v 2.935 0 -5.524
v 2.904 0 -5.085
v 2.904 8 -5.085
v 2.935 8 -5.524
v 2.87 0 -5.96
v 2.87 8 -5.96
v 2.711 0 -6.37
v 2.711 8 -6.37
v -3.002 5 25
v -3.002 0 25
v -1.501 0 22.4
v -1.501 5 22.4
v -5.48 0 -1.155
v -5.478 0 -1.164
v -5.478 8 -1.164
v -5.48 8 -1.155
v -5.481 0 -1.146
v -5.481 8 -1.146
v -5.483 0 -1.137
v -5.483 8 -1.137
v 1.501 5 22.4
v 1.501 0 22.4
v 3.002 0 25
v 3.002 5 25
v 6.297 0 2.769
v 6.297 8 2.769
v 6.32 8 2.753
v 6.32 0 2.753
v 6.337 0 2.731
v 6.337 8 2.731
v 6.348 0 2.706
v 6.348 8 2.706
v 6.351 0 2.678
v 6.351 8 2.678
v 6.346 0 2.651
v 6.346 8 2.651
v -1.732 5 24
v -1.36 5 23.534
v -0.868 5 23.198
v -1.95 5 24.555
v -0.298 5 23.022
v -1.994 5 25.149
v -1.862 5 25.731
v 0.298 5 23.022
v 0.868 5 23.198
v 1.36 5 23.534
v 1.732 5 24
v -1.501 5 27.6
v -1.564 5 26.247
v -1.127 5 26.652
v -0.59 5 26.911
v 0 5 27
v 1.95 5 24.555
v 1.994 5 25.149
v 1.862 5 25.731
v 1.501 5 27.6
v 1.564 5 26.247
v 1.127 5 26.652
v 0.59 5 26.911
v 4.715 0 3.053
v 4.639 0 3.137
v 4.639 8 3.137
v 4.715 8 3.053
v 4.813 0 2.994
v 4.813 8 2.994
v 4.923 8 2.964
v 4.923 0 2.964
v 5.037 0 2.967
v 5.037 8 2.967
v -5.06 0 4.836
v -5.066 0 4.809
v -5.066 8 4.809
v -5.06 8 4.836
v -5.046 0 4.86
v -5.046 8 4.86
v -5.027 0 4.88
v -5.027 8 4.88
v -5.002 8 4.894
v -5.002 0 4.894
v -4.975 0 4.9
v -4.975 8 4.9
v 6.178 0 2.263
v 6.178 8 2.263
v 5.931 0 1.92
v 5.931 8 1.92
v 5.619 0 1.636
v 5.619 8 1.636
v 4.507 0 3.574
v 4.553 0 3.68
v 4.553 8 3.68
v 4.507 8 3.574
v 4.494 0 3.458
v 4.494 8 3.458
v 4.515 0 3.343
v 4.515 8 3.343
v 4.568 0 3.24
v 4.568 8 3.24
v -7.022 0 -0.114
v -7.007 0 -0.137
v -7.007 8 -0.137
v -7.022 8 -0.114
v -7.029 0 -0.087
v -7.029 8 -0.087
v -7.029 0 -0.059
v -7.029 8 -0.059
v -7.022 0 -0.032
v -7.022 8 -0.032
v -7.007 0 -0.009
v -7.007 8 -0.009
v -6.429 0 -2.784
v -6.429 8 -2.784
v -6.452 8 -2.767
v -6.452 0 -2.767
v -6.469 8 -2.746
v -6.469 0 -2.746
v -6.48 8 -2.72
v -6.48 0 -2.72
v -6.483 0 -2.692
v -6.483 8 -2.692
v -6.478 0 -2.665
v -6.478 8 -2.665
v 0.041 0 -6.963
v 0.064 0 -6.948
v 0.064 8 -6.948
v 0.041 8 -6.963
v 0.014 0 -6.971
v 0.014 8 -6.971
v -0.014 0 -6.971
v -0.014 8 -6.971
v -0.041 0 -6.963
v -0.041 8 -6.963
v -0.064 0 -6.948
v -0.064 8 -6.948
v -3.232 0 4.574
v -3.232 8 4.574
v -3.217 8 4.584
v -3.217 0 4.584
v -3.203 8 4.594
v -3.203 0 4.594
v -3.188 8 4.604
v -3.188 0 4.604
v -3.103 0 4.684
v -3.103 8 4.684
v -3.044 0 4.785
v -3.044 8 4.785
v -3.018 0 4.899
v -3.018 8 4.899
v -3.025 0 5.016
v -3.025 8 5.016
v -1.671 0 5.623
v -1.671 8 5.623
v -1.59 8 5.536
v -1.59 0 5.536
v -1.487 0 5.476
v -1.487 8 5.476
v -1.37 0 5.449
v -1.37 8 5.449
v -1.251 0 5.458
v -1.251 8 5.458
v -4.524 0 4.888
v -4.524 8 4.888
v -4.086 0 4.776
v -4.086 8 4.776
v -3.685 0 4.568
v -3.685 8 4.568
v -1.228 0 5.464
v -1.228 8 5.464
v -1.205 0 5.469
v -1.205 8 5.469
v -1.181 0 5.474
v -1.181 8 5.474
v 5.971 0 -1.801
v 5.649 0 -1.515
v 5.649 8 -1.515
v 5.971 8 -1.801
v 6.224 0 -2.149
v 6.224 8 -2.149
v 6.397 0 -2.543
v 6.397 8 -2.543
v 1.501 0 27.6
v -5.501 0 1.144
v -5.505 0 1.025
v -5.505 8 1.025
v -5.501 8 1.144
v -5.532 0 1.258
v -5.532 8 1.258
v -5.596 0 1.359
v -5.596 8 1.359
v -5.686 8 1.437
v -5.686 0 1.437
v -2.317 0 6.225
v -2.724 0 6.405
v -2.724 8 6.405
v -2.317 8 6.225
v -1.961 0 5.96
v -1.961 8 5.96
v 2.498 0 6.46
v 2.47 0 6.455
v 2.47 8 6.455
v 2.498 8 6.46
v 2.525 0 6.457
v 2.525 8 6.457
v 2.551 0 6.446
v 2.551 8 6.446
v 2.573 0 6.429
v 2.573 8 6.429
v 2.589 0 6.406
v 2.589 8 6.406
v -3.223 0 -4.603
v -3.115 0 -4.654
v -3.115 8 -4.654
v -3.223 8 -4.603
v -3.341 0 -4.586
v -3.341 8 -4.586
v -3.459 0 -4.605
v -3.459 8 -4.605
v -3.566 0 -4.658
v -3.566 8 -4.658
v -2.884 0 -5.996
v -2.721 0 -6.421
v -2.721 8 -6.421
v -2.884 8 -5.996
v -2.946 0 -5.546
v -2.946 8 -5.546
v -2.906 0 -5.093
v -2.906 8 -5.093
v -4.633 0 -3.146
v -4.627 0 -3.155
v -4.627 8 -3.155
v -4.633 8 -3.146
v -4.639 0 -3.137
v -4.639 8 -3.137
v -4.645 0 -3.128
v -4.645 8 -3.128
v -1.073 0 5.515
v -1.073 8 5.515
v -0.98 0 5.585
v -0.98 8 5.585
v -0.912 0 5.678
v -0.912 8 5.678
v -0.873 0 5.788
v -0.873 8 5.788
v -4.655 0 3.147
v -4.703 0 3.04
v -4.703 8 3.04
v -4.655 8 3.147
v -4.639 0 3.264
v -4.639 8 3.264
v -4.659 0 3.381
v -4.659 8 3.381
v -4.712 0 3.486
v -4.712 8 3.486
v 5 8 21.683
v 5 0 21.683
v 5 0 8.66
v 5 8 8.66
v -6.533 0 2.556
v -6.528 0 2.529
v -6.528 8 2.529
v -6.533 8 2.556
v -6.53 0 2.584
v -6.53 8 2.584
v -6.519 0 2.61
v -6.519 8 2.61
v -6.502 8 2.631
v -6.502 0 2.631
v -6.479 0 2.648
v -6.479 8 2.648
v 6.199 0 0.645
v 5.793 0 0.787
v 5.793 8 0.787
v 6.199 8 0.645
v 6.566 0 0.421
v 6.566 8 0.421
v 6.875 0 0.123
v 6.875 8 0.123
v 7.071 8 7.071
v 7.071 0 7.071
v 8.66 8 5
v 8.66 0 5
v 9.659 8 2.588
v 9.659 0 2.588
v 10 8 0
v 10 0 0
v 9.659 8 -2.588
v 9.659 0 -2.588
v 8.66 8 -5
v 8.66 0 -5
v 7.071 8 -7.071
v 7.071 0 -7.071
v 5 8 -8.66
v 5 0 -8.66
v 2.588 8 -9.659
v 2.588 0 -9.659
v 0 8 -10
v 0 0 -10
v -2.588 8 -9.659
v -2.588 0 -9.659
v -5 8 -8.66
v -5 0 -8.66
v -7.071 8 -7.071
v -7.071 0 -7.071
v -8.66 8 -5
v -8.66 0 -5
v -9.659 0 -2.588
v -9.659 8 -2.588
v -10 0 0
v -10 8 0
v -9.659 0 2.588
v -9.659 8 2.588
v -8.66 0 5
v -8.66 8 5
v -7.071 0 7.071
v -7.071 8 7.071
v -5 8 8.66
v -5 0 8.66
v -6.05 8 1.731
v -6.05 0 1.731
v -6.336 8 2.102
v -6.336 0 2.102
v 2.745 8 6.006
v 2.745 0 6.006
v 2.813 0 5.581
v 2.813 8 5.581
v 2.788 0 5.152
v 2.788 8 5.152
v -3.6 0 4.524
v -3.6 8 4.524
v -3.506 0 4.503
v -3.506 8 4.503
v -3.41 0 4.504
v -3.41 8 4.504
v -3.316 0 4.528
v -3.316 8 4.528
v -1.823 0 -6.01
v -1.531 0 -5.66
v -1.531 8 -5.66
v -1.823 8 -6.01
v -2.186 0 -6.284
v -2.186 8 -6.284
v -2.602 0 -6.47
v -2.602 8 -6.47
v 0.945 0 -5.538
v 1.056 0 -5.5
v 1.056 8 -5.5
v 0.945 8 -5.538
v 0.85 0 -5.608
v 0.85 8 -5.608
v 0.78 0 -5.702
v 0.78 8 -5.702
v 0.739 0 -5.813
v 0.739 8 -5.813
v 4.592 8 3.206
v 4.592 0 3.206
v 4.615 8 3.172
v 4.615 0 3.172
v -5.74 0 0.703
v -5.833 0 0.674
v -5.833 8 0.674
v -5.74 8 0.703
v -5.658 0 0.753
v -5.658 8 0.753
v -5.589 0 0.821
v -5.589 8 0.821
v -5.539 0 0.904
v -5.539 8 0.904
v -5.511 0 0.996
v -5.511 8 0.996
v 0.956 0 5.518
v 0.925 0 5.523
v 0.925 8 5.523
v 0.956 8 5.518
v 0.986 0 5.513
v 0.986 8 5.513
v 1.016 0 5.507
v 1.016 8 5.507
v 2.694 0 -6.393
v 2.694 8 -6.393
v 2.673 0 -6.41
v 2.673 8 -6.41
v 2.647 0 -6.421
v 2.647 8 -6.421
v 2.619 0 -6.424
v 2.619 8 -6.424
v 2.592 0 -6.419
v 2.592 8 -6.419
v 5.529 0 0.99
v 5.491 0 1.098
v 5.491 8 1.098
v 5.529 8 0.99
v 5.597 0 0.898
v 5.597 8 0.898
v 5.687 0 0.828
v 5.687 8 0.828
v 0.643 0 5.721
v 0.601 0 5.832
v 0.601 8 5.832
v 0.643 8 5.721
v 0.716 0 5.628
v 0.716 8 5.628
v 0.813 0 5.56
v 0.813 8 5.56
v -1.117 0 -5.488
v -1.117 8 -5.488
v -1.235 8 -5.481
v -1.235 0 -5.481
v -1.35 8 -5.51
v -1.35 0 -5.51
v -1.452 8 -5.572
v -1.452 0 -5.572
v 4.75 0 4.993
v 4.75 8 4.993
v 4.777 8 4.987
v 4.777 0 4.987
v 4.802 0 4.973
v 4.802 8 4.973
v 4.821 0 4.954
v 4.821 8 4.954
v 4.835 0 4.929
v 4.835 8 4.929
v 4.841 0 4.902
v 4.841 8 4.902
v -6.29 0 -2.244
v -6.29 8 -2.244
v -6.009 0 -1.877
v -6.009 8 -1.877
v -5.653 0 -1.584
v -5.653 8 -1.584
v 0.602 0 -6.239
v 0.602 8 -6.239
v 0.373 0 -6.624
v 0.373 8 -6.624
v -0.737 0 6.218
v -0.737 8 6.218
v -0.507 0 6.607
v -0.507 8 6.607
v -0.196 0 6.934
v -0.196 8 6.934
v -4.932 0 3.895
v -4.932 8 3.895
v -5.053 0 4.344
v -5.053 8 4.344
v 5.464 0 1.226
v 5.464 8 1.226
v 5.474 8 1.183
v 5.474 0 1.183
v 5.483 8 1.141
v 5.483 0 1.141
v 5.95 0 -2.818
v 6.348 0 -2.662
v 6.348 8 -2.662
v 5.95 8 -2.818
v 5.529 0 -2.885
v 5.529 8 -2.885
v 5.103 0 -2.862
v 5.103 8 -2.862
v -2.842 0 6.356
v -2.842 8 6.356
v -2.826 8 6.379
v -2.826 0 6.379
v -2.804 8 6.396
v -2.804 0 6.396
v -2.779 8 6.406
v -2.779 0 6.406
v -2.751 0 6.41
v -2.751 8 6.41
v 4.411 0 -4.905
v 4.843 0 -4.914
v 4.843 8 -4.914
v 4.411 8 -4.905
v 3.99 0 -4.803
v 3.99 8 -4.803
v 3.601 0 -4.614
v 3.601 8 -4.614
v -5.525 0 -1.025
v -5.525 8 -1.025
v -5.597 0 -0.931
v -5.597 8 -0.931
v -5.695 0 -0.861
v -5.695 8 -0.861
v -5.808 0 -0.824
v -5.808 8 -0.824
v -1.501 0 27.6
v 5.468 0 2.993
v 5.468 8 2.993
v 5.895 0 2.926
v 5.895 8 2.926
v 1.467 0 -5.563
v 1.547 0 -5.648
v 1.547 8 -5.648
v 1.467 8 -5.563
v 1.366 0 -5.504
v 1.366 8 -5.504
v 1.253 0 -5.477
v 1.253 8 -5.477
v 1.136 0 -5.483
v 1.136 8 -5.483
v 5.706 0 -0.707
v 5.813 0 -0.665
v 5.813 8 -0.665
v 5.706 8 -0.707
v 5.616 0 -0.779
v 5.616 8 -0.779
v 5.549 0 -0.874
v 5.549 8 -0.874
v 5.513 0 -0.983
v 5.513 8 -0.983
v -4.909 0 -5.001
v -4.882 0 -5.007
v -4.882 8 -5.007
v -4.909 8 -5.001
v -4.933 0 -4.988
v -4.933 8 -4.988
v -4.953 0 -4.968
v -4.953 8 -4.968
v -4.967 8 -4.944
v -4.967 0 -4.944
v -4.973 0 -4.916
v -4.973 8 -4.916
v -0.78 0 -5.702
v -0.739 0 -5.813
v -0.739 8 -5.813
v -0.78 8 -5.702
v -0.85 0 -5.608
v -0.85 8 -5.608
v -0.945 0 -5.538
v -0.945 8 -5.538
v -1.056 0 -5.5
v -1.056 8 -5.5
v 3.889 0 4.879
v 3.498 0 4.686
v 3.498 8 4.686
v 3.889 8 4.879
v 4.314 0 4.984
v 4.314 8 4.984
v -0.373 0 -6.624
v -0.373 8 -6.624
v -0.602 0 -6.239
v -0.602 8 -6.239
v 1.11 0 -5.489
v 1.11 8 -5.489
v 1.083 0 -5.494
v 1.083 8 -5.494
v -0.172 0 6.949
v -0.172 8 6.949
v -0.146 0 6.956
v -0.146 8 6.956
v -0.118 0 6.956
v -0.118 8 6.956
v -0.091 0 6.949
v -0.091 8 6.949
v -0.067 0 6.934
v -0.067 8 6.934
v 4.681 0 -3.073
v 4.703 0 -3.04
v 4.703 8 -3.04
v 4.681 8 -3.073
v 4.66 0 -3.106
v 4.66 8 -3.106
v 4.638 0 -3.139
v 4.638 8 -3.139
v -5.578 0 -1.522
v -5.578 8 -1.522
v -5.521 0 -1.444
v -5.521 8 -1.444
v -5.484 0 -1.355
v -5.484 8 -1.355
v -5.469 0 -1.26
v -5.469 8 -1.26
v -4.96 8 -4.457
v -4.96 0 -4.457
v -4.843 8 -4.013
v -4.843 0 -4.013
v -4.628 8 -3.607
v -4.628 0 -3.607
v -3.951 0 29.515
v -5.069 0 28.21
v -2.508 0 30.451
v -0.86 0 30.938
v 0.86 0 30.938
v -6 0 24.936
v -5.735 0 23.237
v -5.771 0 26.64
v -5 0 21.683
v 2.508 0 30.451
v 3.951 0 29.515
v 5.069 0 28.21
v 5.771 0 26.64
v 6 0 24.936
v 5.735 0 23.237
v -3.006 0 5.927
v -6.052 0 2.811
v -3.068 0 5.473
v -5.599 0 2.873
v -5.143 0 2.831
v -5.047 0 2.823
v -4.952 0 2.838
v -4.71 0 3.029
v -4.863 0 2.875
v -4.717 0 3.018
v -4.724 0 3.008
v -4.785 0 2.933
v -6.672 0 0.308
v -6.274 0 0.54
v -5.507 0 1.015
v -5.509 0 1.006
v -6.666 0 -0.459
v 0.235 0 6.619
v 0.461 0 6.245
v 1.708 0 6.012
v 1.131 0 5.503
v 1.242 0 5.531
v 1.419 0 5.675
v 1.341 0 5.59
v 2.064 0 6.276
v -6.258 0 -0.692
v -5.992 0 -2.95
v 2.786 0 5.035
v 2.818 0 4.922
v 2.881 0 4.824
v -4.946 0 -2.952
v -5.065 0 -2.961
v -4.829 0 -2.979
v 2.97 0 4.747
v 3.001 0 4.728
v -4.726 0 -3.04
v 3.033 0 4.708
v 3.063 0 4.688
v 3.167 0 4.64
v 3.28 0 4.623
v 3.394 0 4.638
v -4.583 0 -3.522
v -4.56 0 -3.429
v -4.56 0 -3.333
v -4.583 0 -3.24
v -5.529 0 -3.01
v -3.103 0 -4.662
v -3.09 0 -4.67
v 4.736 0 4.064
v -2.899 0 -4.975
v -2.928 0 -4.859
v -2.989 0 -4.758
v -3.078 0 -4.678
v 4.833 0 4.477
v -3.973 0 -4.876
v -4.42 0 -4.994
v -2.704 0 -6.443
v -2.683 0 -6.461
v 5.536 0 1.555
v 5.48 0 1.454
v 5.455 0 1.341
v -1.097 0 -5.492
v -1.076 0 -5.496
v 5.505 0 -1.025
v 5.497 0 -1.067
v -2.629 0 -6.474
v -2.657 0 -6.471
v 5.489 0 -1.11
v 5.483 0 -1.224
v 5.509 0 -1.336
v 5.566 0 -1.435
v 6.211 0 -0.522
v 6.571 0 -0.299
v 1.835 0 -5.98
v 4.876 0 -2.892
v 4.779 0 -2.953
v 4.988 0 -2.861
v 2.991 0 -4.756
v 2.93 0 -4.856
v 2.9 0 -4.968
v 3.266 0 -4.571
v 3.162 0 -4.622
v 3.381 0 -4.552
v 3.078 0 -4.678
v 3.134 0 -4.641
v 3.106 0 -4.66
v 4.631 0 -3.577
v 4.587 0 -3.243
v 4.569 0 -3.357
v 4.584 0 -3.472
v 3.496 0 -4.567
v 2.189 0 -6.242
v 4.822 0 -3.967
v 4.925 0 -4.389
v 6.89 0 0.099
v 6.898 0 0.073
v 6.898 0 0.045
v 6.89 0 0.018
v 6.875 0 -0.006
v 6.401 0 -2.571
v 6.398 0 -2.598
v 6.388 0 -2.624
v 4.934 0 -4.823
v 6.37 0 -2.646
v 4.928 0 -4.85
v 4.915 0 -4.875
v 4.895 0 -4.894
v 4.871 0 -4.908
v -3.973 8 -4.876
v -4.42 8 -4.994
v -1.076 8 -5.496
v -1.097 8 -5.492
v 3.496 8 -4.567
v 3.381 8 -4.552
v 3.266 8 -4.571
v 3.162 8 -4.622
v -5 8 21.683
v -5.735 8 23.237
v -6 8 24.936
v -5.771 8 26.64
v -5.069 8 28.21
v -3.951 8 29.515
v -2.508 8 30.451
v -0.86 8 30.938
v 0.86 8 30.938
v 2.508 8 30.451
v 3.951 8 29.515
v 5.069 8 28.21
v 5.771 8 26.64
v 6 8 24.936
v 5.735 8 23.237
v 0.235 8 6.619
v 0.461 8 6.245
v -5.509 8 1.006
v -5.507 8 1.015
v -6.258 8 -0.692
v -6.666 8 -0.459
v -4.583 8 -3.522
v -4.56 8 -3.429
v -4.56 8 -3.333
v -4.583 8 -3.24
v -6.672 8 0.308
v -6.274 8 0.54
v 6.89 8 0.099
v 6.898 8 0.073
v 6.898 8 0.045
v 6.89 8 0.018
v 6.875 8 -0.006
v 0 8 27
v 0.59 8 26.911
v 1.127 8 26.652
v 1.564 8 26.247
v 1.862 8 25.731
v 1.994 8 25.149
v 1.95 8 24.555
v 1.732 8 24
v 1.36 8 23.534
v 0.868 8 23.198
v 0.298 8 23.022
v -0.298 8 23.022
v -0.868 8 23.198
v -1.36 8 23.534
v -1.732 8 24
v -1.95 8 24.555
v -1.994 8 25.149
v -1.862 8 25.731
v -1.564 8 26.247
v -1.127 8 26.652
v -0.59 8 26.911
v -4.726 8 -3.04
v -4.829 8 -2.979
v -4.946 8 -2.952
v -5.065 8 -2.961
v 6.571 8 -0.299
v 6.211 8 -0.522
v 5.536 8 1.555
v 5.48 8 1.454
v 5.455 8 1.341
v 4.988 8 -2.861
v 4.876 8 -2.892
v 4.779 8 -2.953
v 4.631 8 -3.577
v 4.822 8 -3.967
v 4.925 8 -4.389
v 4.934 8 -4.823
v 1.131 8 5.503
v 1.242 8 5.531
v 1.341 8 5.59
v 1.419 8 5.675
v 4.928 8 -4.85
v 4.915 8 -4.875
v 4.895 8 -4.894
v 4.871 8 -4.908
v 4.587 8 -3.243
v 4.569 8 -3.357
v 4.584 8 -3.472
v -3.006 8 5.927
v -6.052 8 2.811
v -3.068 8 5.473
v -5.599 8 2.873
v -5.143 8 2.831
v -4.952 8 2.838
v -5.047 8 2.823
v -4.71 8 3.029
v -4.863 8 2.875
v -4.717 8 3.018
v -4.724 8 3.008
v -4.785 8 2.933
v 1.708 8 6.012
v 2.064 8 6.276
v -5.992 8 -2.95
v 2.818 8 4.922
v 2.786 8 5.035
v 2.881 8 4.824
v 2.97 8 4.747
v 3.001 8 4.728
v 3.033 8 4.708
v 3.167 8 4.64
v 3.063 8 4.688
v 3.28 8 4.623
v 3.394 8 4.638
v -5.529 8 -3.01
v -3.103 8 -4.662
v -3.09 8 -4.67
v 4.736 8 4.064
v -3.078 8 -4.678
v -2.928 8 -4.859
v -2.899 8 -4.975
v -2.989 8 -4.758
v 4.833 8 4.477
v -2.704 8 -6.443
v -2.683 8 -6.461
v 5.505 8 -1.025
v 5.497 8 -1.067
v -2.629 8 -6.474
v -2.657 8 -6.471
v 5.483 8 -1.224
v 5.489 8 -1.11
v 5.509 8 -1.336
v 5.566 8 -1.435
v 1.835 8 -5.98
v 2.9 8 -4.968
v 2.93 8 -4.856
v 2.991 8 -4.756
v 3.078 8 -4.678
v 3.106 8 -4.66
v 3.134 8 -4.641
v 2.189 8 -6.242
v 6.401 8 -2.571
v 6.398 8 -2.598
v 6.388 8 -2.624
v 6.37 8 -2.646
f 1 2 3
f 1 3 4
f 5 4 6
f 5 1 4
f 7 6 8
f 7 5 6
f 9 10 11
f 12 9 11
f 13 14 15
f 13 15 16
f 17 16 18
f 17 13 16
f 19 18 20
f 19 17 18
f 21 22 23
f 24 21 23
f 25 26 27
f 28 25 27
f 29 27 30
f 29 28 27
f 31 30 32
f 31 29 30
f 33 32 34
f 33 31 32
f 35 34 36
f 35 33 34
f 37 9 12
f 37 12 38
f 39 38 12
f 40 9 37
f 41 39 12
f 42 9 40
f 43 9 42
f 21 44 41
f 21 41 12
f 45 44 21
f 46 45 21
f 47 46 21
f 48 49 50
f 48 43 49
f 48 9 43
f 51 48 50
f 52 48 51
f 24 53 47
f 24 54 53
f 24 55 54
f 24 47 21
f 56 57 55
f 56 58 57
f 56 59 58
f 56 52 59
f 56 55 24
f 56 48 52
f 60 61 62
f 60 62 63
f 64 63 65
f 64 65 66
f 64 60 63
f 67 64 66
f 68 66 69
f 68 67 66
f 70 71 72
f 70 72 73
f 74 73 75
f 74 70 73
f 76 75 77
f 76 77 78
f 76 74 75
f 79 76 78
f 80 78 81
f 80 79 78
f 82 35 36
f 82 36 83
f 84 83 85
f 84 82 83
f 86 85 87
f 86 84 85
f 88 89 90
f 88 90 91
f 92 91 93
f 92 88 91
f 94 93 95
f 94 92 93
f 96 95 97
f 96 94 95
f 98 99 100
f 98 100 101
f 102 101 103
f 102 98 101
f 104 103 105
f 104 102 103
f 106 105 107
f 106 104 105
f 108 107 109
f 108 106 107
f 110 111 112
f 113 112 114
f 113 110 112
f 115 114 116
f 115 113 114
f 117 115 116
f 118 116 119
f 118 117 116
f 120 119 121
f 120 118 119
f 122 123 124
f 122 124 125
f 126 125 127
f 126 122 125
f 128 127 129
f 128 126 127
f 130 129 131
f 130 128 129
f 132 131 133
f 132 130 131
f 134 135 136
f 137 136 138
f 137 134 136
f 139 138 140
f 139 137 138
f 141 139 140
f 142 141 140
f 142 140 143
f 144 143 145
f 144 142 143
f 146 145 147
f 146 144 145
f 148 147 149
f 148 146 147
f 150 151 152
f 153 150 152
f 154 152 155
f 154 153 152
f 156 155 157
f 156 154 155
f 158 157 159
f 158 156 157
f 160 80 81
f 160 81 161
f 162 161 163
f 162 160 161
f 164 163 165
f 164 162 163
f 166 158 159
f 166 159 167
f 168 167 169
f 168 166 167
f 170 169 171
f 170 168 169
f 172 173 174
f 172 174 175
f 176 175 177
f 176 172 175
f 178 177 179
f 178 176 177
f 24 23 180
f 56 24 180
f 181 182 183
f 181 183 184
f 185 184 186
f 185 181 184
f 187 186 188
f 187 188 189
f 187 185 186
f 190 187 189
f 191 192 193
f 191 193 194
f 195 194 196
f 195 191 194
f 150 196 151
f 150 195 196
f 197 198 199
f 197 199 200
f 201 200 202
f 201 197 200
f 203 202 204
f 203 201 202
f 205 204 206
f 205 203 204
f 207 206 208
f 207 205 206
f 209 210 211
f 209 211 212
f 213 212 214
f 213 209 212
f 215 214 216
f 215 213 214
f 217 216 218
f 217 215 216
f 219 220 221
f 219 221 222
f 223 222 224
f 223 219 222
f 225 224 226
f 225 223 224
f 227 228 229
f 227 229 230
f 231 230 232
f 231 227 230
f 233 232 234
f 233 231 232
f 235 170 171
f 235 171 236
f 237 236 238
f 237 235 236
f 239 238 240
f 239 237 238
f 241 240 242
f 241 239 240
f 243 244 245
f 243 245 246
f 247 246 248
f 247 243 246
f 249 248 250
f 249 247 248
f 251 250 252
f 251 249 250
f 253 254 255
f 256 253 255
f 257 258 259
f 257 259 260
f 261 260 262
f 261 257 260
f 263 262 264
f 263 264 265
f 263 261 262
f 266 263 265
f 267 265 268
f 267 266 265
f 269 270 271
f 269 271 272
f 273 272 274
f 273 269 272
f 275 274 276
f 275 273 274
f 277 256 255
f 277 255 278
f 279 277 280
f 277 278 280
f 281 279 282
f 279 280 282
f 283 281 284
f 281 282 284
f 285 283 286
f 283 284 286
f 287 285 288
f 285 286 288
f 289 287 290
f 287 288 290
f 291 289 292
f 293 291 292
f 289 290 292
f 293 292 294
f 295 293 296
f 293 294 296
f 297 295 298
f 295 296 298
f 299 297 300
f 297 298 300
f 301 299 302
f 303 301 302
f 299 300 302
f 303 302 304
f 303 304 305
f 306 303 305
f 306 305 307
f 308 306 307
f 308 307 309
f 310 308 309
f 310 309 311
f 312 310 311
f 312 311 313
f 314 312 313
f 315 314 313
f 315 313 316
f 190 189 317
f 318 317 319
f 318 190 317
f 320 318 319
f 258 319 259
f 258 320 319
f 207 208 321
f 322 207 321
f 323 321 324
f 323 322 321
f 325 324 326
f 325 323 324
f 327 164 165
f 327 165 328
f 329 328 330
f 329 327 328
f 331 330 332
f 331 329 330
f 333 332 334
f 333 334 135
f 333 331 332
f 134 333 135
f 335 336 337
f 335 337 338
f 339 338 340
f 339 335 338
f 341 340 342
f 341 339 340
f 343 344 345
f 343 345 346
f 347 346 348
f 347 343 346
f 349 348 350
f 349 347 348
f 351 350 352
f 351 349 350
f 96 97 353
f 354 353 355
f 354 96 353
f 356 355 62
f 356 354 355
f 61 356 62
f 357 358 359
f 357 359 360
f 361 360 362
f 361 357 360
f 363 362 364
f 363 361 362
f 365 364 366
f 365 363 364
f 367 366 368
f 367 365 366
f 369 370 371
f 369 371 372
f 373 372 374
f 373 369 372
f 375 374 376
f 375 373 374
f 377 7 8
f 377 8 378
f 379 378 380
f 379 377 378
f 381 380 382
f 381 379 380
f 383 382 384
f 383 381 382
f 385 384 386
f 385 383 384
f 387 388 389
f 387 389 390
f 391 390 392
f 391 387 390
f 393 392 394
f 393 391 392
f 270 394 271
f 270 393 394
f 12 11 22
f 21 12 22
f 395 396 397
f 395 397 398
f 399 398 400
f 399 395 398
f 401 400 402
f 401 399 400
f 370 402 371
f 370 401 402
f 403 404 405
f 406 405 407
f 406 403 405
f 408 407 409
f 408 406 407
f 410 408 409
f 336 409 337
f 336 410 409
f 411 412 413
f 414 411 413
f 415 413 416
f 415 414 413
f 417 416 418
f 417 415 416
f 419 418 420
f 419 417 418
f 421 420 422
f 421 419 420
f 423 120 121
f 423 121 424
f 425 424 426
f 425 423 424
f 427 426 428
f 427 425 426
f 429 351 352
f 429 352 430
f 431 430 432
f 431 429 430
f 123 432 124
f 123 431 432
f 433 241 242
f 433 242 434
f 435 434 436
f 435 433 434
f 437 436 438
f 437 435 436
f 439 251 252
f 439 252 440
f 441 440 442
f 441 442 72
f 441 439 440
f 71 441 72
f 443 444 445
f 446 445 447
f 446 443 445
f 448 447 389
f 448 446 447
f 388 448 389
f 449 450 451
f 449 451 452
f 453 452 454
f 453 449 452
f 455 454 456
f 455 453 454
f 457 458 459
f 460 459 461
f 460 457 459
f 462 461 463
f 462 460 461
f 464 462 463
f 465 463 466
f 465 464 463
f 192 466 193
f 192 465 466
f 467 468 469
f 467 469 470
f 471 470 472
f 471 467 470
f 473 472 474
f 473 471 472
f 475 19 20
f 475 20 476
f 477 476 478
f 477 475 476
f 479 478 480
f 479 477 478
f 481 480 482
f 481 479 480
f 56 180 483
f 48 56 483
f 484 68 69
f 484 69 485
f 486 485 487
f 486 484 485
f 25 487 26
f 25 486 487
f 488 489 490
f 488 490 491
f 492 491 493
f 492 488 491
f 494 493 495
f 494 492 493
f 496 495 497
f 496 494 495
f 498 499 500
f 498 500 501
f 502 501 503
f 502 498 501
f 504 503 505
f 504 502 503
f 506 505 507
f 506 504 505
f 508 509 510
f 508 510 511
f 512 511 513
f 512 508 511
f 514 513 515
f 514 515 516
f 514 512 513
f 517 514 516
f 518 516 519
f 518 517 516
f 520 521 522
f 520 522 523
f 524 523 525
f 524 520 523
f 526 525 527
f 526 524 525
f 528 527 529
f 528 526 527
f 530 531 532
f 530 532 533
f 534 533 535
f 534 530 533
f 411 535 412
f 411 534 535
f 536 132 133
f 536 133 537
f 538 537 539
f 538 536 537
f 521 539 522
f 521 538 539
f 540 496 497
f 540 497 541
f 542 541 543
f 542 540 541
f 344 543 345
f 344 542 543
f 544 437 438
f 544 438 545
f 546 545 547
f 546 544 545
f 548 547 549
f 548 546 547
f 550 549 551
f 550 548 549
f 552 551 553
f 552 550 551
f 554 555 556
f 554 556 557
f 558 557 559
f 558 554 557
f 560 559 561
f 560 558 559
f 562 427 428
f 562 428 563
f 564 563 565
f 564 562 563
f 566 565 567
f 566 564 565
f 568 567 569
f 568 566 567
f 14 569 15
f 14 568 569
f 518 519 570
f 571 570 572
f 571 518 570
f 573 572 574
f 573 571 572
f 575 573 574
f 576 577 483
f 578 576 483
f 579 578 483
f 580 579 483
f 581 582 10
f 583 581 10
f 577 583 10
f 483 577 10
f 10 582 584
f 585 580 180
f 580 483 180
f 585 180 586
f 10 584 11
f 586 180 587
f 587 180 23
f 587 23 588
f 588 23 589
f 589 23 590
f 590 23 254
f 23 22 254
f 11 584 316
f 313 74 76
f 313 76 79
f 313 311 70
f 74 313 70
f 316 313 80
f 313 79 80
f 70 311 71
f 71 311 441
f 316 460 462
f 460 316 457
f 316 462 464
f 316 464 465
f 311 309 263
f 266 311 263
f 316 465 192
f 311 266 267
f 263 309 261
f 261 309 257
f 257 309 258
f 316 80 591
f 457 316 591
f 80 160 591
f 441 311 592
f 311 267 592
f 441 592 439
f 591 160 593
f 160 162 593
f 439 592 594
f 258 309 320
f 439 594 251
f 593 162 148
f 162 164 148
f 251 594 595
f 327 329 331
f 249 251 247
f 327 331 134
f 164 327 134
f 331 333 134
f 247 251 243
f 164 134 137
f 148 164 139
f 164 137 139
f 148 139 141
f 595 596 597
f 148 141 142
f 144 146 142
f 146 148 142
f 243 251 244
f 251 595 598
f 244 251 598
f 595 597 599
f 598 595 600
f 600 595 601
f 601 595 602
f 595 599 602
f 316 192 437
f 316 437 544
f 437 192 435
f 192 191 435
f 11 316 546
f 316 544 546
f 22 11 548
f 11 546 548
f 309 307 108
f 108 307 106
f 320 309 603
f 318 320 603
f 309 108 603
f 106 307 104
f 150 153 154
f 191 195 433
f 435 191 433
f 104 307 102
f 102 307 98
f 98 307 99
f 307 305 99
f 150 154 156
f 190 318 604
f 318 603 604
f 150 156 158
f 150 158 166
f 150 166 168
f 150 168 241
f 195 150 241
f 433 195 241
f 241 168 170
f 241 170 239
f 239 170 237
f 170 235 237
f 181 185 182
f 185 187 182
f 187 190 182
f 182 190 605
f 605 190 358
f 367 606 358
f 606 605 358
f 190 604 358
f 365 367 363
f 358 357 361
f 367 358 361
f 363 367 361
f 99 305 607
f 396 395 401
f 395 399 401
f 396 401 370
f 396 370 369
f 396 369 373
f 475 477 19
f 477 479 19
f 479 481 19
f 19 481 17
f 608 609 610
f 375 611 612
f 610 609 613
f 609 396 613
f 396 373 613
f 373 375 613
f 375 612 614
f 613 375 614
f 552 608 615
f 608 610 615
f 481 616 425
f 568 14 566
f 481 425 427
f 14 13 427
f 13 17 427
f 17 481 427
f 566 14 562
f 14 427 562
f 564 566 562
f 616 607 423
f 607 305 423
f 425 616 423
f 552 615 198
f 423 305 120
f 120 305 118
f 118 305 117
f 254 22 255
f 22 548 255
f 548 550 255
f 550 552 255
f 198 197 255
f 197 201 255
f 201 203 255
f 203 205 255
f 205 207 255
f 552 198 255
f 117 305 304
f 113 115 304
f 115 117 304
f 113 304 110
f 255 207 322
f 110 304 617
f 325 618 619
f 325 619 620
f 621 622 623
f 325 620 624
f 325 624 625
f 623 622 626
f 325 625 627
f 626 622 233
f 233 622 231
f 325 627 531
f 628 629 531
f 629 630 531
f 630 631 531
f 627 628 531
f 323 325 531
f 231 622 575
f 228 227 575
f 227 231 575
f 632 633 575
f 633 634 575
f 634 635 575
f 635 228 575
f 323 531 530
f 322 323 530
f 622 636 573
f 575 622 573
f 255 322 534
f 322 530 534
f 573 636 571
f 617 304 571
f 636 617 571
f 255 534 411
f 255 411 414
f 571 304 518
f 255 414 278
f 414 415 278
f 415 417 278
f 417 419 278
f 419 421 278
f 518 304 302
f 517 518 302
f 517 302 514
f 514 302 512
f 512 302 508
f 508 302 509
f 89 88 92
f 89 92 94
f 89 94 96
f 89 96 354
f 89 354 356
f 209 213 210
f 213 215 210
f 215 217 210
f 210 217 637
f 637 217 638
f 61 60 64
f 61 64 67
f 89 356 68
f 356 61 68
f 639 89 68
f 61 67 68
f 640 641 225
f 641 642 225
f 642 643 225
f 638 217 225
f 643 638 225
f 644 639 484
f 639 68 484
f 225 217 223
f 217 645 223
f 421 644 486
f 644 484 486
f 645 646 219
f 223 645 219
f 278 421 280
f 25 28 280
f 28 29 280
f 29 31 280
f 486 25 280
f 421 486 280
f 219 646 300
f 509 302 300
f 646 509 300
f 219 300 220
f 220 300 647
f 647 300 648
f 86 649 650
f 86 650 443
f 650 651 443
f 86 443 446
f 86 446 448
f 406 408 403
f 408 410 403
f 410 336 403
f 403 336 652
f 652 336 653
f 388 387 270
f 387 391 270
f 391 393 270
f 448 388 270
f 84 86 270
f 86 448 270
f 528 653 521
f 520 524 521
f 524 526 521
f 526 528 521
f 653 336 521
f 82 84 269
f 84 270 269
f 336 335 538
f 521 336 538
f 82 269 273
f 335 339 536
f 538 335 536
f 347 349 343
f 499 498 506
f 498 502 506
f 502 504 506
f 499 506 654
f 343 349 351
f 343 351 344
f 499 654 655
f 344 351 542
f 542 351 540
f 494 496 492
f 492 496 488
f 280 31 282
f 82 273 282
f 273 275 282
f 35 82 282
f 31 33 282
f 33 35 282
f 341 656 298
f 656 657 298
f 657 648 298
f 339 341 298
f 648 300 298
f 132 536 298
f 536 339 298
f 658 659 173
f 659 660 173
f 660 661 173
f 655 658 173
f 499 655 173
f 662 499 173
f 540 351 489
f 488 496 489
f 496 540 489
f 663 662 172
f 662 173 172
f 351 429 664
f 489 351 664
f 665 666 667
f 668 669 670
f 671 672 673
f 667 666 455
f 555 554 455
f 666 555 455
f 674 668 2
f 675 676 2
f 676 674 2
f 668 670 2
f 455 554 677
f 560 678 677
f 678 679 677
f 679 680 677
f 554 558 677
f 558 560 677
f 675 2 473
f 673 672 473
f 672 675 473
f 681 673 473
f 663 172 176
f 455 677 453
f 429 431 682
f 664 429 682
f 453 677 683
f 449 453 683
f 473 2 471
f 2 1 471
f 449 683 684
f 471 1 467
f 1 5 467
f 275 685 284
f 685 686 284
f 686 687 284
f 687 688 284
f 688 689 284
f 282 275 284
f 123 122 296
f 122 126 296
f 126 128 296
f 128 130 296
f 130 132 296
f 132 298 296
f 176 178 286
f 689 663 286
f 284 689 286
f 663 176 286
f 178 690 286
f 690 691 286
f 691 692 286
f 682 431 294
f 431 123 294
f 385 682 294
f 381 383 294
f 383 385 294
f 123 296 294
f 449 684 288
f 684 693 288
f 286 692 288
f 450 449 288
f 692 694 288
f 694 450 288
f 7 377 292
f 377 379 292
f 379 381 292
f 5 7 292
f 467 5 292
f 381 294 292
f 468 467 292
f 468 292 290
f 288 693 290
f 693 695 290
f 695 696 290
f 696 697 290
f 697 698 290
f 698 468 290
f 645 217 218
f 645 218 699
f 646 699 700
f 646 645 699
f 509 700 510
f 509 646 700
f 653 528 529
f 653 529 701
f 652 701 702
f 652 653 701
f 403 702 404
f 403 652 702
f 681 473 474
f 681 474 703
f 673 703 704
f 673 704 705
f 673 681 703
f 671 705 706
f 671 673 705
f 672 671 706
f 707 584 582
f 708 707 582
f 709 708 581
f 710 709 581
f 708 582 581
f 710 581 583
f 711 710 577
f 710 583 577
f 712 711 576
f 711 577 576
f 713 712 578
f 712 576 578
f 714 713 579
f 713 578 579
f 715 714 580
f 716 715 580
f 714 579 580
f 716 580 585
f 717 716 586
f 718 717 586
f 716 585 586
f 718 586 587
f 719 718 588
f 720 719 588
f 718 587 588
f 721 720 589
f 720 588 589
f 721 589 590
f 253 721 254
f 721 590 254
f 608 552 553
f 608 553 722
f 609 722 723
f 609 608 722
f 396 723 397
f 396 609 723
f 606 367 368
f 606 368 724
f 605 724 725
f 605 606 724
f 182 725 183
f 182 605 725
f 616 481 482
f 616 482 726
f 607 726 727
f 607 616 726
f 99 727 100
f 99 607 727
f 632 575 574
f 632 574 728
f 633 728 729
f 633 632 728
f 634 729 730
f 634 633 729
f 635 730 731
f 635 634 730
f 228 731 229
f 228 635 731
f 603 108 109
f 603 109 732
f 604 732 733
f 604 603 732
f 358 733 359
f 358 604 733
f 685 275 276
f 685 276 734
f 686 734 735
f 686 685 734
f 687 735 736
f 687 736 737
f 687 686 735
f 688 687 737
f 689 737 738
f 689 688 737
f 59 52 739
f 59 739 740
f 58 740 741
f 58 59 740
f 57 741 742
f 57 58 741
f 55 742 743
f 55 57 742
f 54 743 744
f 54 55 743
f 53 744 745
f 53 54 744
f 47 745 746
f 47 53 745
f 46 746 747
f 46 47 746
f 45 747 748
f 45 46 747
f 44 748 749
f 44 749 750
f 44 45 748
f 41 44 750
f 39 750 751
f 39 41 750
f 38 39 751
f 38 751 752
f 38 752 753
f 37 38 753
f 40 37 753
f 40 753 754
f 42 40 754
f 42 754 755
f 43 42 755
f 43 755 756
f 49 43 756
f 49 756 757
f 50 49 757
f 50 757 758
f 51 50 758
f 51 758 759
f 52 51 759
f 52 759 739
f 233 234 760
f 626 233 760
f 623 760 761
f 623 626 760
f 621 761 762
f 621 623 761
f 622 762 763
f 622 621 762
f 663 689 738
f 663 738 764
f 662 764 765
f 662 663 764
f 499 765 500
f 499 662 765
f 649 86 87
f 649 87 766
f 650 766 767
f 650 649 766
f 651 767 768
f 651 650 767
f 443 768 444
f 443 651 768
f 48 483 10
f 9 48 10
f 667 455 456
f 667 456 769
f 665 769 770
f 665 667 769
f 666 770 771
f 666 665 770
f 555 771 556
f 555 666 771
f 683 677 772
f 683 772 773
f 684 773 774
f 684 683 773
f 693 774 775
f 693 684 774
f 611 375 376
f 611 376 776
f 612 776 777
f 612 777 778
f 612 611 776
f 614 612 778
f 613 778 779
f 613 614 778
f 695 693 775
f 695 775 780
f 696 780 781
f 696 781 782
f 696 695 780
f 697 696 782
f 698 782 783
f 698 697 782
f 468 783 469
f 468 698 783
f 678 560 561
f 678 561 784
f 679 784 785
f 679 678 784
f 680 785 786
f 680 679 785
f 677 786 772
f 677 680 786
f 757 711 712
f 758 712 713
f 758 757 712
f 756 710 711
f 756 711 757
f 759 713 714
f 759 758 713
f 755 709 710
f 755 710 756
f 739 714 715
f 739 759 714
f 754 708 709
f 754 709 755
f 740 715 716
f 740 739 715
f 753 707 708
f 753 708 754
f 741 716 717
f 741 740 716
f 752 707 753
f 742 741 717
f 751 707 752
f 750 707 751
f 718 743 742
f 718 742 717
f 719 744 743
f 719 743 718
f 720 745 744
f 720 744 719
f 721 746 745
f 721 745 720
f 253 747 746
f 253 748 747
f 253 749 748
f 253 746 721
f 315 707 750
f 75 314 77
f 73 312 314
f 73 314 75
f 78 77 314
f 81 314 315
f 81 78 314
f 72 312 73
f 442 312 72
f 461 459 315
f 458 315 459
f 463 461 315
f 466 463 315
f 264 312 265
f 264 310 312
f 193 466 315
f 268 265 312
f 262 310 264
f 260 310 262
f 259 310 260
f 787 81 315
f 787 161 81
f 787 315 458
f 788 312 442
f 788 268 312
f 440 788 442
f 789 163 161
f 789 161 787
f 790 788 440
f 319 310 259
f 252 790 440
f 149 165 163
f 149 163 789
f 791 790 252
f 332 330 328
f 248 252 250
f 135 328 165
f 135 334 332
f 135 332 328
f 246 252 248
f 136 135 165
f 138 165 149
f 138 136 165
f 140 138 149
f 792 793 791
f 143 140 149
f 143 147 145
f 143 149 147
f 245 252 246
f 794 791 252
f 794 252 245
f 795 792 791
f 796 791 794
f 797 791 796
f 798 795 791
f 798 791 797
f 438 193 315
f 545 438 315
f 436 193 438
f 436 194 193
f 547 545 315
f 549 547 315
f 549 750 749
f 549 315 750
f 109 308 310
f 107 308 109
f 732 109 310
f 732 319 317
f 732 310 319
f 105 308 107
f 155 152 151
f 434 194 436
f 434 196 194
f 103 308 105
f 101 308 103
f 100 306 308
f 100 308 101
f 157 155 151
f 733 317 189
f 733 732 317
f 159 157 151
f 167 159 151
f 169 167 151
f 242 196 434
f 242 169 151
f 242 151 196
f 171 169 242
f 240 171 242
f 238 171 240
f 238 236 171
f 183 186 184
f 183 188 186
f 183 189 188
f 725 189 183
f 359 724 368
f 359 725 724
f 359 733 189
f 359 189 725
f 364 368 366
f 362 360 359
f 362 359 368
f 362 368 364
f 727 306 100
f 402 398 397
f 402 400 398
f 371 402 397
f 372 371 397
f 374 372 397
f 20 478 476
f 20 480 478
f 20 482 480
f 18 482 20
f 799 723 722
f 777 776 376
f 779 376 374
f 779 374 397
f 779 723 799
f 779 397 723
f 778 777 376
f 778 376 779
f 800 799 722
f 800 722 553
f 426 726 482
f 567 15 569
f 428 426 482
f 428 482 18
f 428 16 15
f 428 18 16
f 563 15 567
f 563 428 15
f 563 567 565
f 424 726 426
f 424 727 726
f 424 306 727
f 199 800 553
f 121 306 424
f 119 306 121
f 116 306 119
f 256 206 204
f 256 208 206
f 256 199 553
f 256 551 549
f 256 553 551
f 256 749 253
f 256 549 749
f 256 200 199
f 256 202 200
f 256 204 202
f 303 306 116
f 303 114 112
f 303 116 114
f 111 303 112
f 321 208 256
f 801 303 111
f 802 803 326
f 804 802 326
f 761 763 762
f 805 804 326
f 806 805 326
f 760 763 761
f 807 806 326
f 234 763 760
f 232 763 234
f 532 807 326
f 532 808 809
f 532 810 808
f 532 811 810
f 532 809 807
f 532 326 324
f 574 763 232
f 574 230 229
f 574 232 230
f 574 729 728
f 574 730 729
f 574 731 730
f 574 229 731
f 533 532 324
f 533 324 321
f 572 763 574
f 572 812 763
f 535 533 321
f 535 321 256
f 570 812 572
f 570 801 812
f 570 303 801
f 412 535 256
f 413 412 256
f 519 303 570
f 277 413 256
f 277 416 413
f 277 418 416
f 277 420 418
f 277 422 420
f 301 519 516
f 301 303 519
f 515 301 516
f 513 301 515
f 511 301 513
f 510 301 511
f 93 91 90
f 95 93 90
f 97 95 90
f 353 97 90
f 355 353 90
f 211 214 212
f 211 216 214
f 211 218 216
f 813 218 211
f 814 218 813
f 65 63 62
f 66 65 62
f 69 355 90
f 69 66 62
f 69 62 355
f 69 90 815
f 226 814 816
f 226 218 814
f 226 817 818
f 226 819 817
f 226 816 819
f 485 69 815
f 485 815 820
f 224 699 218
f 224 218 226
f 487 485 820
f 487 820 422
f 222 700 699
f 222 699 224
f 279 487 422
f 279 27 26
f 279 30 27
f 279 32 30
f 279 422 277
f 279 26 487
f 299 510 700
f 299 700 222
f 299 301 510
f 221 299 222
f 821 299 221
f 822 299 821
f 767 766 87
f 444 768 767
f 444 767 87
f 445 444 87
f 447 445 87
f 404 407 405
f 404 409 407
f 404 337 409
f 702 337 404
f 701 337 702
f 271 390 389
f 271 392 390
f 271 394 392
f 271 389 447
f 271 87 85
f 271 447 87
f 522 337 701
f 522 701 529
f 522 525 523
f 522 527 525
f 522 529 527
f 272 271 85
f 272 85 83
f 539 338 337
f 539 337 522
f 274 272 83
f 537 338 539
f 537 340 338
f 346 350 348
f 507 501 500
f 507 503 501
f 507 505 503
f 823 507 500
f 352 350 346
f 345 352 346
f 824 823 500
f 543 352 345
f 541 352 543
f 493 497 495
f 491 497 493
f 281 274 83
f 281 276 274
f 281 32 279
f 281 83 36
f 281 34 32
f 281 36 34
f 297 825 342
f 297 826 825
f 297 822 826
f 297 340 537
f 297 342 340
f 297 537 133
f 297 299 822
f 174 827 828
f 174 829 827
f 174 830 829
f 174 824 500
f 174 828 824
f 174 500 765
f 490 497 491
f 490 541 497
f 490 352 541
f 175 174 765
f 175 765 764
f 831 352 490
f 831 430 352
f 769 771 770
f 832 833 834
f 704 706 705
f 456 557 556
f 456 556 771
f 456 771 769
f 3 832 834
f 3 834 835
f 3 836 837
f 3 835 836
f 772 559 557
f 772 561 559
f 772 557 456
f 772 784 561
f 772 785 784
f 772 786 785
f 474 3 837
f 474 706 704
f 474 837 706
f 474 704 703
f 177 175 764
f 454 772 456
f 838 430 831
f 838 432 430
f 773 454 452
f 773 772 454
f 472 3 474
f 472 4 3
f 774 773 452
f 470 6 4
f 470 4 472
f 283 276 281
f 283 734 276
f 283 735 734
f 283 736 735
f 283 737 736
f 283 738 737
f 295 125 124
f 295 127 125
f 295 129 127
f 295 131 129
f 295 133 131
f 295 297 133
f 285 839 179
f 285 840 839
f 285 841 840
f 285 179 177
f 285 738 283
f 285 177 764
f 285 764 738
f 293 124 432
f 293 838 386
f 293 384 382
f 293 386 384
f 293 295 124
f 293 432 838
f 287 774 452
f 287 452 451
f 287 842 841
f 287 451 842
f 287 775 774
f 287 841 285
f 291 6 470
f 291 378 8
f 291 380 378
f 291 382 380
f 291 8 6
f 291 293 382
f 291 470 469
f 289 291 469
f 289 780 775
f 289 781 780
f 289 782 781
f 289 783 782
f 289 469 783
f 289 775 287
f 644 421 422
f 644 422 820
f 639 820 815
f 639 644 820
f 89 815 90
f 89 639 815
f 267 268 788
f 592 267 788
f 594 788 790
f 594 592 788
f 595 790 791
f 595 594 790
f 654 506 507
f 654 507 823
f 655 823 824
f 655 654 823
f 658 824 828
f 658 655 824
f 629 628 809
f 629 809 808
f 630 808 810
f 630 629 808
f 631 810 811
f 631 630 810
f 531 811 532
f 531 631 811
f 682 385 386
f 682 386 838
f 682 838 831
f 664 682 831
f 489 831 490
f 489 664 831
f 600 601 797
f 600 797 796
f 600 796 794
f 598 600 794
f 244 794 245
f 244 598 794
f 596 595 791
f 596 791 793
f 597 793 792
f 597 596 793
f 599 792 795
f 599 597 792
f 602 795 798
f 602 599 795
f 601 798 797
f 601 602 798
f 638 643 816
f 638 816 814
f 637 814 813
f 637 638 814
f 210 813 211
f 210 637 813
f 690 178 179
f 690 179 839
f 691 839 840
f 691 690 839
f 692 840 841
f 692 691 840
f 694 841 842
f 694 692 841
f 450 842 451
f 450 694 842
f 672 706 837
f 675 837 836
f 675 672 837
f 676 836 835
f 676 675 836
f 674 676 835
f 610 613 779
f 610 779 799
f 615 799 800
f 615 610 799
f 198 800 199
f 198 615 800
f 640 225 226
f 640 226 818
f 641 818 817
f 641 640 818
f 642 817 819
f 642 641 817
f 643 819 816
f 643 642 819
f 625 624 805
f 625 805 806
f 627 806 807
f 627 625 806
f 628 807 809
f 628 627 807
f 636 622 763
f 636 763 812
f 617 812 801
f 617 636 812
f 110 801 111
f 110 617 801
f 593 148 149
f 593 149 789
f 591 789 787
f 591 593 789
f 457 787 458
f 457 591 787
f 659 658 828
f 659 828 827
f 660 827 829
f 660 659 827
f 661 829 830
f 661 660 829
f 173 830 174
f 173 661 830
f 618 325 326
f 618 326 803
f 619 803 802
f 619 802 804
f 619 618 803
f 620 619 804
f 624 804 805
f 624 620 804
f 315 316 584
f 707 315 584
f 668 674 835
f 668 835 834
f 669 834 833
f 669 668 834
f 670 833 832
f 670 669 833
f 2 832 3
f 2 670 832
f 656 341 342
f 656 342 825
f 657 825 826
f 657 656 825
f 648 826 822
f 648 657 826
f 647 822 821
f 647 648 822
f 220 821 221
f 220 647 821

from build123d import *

# Parameters (mm, degrees)
SKETCH1_R           = 10
SKETCH1_R_2         = 5.6
BOSS_EXTRUDE1_DEPTH = 8
CUT_EXTRUDE1_START  = -8
CUT_EXTRUDE1_DEPTH  = 8
BOSS_EXTRUDE2_START = -8
SKETCH3_R           = 2
BOSS_EXTRUDE2_DEPTH = 8
CUT_EXTRUDE2_DEPTH  = 5


with BuildPart() as part:
    # Sketch1 → Boss-Extrude1 (new body)
    with BuildSketch(Plane(origin=(0, 0, 0), x_dir=(1, 0, 0), z_dir=(0, 1, 0))):
        with Locations(Location((0, 0, 0), (0, 0, 270))):
            Circle(SKETCH1_R)
        with Locations(Location((0, 0, 0), (0, 0, 270))):
            Circle(SKETCH1_R_2, mode=Mode.SUBTRACT)
    extrude(amount=BOSS_EXTRUDE1_DEPTH)

    # Sketch2 → Cut-Extrude1 (cut)
    with BuildSketch(Plane(origin=(0, 8, 0), x_dir=(1, 0, 0), z_dir=(0, 1, 0)).offset(CUT_EXTRUDE1_START)):
        with BuildLine():
            ThreePointArc((0.064249913, 6.948346368), (0, 6.971717727), (-0.064249913, 6.948346368))
            ThreePointArc((-0.064249913, 6.948346368), (-0.498286109, 6.437987083), (-0.739423422, 5.812921636))
            ThreePointArc((-0.739423422, 5.812921636), (-0.850059891, 5.608071058), (-1.056027259, 5.499527837))
            ThreePointArc((-1.056027259, 5.499527837), (0, 5.6), (1.056027259, 5.499527837))
            ThreePointArc((1.056027259, 5.499527837), (0.850059891, 5.608071058), (0.739423422, 5.812921636))
            ThreePointArc((0.739423422, 5.812921636), (0.498286109, 6.437987083), (0.064249913, 6.948346368))
        make_face()
        with BuildLine():
            ThreePointArc((-3.07784083, 4.678343278), (-2.13595945, 5.176647296), (-1.116741665, 5.487521121))
            ThreePointArc((-1.116741665, 5.487521121), (-1.350243109, 5.510209511), (-1.530862217, 5.659923992))
            ThreePointArc((-1.530862217, 5.659923992), (-1.996402784, 6.157420979), (-2.601935295, 6.469769583))
            ThreePointArc((-2.601935295, 6.469769583), (-2.670238307, 6.466774526), (-2.720653655, 6.420594828))
            ThreePointArc((-2.720653655, 6.420594828), (-2.927784399, 5.772859186), (-2.905902141, 5.093163831))
            ThreePointArc((-2.905902141, 5.093163831), (-2.928170827, 4.859350312), (-3.07784083, 4.678343278))
        make_face()
        with BuildLine():
            ThreePointArc((1.546699763, 5.647927275), (1.366304802, 5.503873184), (1.136351309, 5.483493932))
            ThreePointArc((1.136351309, 5.483493932), (2.145111804, 5.172861428), (3.077665403, 4.678458685))
            ThreePointArc((3.077665403, 4.678458685), (2.929649667, 4.855512924), (2.904074445, 5.084865862))
            ThreePointArc((2.904074445, 5.084865862), (2.914679464, 5.743680773), (2.710627264, 6.370188757))
            ThreePointArc((2.710627264, 6.370188757), (2.660211916, 6.416368455), (2.591908904, 6.419363512))
            ThreePointArc((2.591908904, 6.419363512), (2.004925243, 6.120871804), (1.546699763, 5.647927275))
        make_face()
        with BuildLine():
            ThreePointArc((-4.626747894, 3.154869874), (-3.942798212, 3.976725067), (-3.115113277, 4.653608199))
            ThreePointArc((-3.115113277, 4.653608199), (-3.341080574, 4.586023742), (-3.565845172, 4.65750628))
            ThreePointArc((-3.565845172, 4.65750628), (-4.193243775, 4.947890892), (-4.882025833, 5.007317379))
            ThreePointArc((-4.882025833, 5.007317379), (-4.943983429, 4.978411876), (-4.972888932, 4.916454281))
            ThreePointArc((-4.972888932, 4.916454281), (-4.914521213, 4.231672555), (-4.62778579, 3.607080208))
            ThreePointArc((-4.62778579, 3.607080208), (-4.55723094, 3.381135785), (-4.626747894, 3.154869874))
        make_face()
        with BuildLine():
            ThreePointArc((3.60147946, 4.613515157), (3.380624437, 4.551916923), (3.162225119, 4.621723953))
            ThreePointArc((3.162225119, 4.621723953), (3.969775698, 3.949795047), (4.637621263, 3.138864289))
            ThreePointArc((4.637621263, 3.138864289), (4.568924656, 3.357086949), (4.631064299, 3.577266461))
            ThreePointArc((4.631064299, 3.577266461), (4.885266795, 4.17532686), (4.934309795, 4.823316006))
            ThreePointArc((4.934309795, 4.823316006), (4.905404292, 4.885273602), (4.843446696, 4.914179105))
            ThreePointArc((4.843446696, 4.914179105), (4.197804444, 4.865705756), (3.60147946, 4.613515157))
        make_face()
        with BuildLine():
            ThreePointArc((-5.477673311, 1.164085519), (-5.155741489, 2.185939087), (-4.645101504, 3.127783883))
            ThreePointArc((-4.645101504, 3.127783883), (-4.829188719, 2.979467261), (-5.064867635, 2.960991018))
            ThreePointArc((-5.064867635, 2.960991018), (-5.762609895, 2.993266281), (-6.428898584, 2.783634848))
            ThreePointArc((-6.428898584, 2.783634848), (-6.475078282, 2.7332195), (-6.478073339, 2.664916489))
            ThreePointArc((-6.478073339, 2.664916489), (-6.160056055, 2.051923175), (-5.652515264, 1.58363038))
            ThreePointArc((-5.652515264, 1.58363038), (-5.499714793, 1.401104329), (-5.477673311, 1.164085519))
        make_face()
        with BuildLine():
            ThreePointArc((5.102964873, 2.86242986), (4.876497297, 2.891701995), (4.702948527, 3.040111043))
            ThreePointArc((4.702948527, 3.040111043), (5.186580684, 2.111724605), (5.488979978, 1.109548918))
            ThreePointArc((5.488979978, 1.109548918), (5.509040687, 1.335802715), (5.649058612, 1.51465515))
            ThreePointArc((5.649058612, 1.51465515), (6.106834087, 1.967933206), (6.396761999, 2.543225468))
            ThreePointArc((6.396761999, 2.543225468), (6.393766942, 2.61152848), (6.347587244, 2.661943828))
            ThreePointArc((6.347587244, 2.661943828), (5.741485734, 2.862816923), (5.102964873, 2.86242986))
        make_face()
        with BuildLine():
            ThreePointArc((-5.510664325, -0.996282441), (-5.599538908, 0.071861119), (-5.483282283, 1.137372148))
            ThreePointArc((-5.483282283, 1.137372148), (-5.597366262, 0.930602816), (-5.808201648, 0.824220718))
            ThreePointArc((-5.808201648, 0.824220718), (-6.468837551, 0.587557408), (-7.007056195, 0.137257497))
            ThreePointArc((-7.007056195, 0.137257497), (-7.030427554, 0.073007584), (-7.007056195, 0.008757671))
            ThreePointArc((-7.007056195, 0.008757671), (-6.479586979, -0.435338259), (-5.8326499, -0.673911904))
            ThreePointArc((-5.8326499, -0.673911904), (-5.621271562, -0.784771791), (-5.510664325, -0.996282441))
        make_face()
        with BuildLine():
            ThreePointArc((5.812810952, 0.664521681), (5.615514351, 0.779198979), (5.513031953, 0.983096477))
            ThreePointArc((5.513031953, 0.983096477), (5.599695706, -0.058378103), (5.49133793, -1.097819539))
            ThreePointArc((5.49133793, -1.097819539), (5.59652681, -0.897662861), (5.793441288, -0.786522929))
            ThreePointArc((5.793441288, -0.786522929), (6.388422373, -0.542837618), (6.875338784, -0.122959741))
            ThreePointArc((6.875338784, -0.122959741), (6.898710143, -0.058709827), (6.875338784, 0.005540086))
            ThreePointArc((6.875338784, 0.005540086), (6.396892952, 0.420193633), (5.812810952, 0.664521681))
        make_face()
        with BuildLine():
            ThreePointArc((-4.723716983, -3.00773966), (-5.209771972, -2.053844201), (-5.505416772, -1.024883487))
            ThreePointArc((-5.505416772, -1.024883487), (-5.532233953, -1.25849938), (-5.685687223, -1.436678055))
            ThreePointArc((-5.685687223, -1.436678055), (-6.204243765, -1.907832783), (-6.52847941, -2.528927711))
            ThreePointArc((-6.52847941, -2.528927711), (-6.525484353, -2.597230723), (-6.479304655, -2.647646071))
            ThreePointArc((-6.479304655, -2.647646071), (-5.827313187, -2.855366074), (-5.14346104, -2.83114388))
            ThreePointArc((-5.14346104, -2.83114388), (-4.906005926, -2.853880543), (-4.723716983, -3.00773966))
        make_face()
        with BuildLine():
            ThreePointArc((-3.231573409, -4.573503395), (-4.040870944, -3.877030051), (-4.703269727, -3.0396141))
            ThreePointArc((-4.703269727, -3.0396141), (-4.639287647, -3.264216822), (-4.711631901, -3.486267262))
            ThreePointArc((-4.711631901, -3.486267262), (-5.005567924, -4.11636587), (-5.066027207, -4.809018249))
            ThreePointArc((-5.066027207, -4.809018249), (-5.037121704, -4.870975845), (-4.975164108, -4.899881348))
            ThreePointArc((-4.975164108, -4.899881348), (-4.301827611, -4.844494009), (-3.685350478, -4.568078128))
            ThreePointArc((-3.685350478, -4.568078128), (-3.457618103, -4.500210794), (-3.231573409, -4.573503395))
        make_face()
        with BuildLine():
            ThreePointArc((5.618520803, -1.63637781), (5.480067966, -1.454143469), (5.464186765, -1.225831555))
            ThreePointArc((5.464186765, -1.225831555), (5.14101235, -2.220358534), (4.638570438, -3.13746144))
            ThreePointArc((4.638570438, -3.13746144), (4.812780485, -2.993714728), (5.037083425, -2.967248735))
            ThreePointArc((5.037083425, -2.967248735), (5.683333022, -2.971442449), (6.297181173, -2.769337092))
            ThreePointArc((6.297181173, -2.769337092), (6.343360871, -2.718921743), (6.346355928, -2.650618732))
            ThreePointArc((6.346355928, -2.650618732), (6.063599568, -2.085255724), (5.618520803, -1.63637781))
        make_face()
        with BuildLine():
            ThreePointArc((-1.251247201, -5.45842289), (-2.260605052, -5.123442671), (-3.188432984, -4.603682777))
            ThreePointArc((-3.188432984, -4.603682777), (-3.044381817, -4.784979292), (-3.024926972, -5.015718698))
            ThreePointArc((-3.024926972, -5.015718698), (-3.05036452, -5.701707725), (-2.842344676, -6.355891))
            ThreePointArc((-2.842344676, -6.355891), (-2.791929328, -6.402070698), (-2.723626316, -6.405065755))
            ThreePointArc((-2.723626316, -6.405065755), (-2.131541606, -6.102796604), (-1.671238282, -5.623159457))
            ThreePointArc((-1.671238282, -5.623159457), (-1.48668328, -5.475931261), (-1.251247201, -5.45842289))
        make_face()
        with BuildLine():
            ThreePointArc((4.553131765, -3.68047341), (4.494207557, -3.457914037), (4.567722636, -3.239739175))
            ThreePointArc((4.567722636, -3.239739175), (3.883669423, -4.034490279), (3.063445285, -4.68778231))
            ThreePointArc((3.063445285, -4.68778231), (3.280286024, -4.622628788), (3.497760134, -4.685635919))
            ThreePointArc((3.497760134, -4.685635919), (4.09857718, -4.943062107), (4.750308422, -4.993019623))
            ThreePointArc((4.750308422, -4.993019623), (4.812266018, -4.964114119), (4.841171521, -4.902156524))
            ThreePointArc((4.841171521, -4.902156524), (4.795474246, -4.268133163), (4.553131765, -3.68047341))
        make_face()
        with BuildLine():
            ThreePointArc((0.925303441, -5.52302576), (-0.130378711, -5.598482061), (-1.181403822, -5.473964286))
            ThreePointArc((-1.181403822, -5.473964286), (-0.980381907, -5.584707692), (-0.873319684, -5.787714078))
            ThreePointArc((-0.873319684, -5.787714078), (-0.632839966, -6.418904201), (-0.195967325, -6.934048611))
            ThreePointArc((-0.195967325, -6.934048611), (-0.131717411, -6.95741997), (-0.067467498, -6.934048611))
            ThreePointArc((-0.067467498, -6.934048611), (0.357915774, -6.438102524), (0.600752826, -5.831518965))
            ThreePointArc((0.600752826, -5.831518965), (0.715816891, -5.627603722), (0.925303441, -5.52302576))
        make_face()
        with BuildLine():
            ThreePointArc((2.787896701, -5.152413925), (2.8176875, -4.922252146), (2.970261988, -4.747372297))
            ThreePointArc((2.970261988, -4.747372297), (2.028927178, -5.219526272), (1.015839733, -5.507092666))
            ThreePointArc((1.015839733, -5.507092666), (1.242257752, -5.531230611), (1.418818304, -5.675015626))
            ThreePointArc((1.418818304, -5.675015626), (1.878837632, -6.153725835), (2.470217884, -6.455471826))
            ThreePointArc((2.470217884, -6.455471826), (2.538520896, -6.452476769), (2.588936244, -6.406297071))
            ThreePointArc((2.588936244, -6.406297071), (2.790550207, -5.795561613), (2.787896701, -5.152413925))
        make_face()
    extrude(amount=CUT_EXTRUDE1_DEPTH, mode=Mode.SUBTRACT)

    # Sketch3 → Boss-Extrude2 (add)
    with BuildSketch(Plane(origin=(0, 8, 0), x_dir=(1, 0, 0), z_dir=(0, 1, 0)).offset(BOSS_EXTRUDE2_START)):
        with BuildLine():
            Line((-5, -8.660254038), (-5, -21.68337521))
            ThreePointArc((-5, -21.68337521), (0, -31), (5, -21.68337521))
            Line((5, -21.68337521), (5, -8.660254038))
            ThreePointArc((5, -8.660254038), (0, -10), (-5, -8.660254038))
        make_face()
        with Locations(Location((0, -25, 0), (0, 0, 270))):
            Circle(SKETCH3_R, mode=Mode.SUBTRACT)
    extrude(amount=BOSS_EXTRUDE2_DEPTH)

    # Sketch4 → Cut-Extrude2 (cut)
    with BuildSketch(Plane.XZ):
        Polygon((1.5011107, 27.6), (-1.5011107, 27.6), (-3.0022214, 25), (-1.5011107, 22.4), (1.5011107, 22.4), (3.0022214, 25), align=None)
    extrude(amount=-CUT_EXTRUDE2_DEPTH, mode=Mode.SUBTRACT)


solid = part.part
